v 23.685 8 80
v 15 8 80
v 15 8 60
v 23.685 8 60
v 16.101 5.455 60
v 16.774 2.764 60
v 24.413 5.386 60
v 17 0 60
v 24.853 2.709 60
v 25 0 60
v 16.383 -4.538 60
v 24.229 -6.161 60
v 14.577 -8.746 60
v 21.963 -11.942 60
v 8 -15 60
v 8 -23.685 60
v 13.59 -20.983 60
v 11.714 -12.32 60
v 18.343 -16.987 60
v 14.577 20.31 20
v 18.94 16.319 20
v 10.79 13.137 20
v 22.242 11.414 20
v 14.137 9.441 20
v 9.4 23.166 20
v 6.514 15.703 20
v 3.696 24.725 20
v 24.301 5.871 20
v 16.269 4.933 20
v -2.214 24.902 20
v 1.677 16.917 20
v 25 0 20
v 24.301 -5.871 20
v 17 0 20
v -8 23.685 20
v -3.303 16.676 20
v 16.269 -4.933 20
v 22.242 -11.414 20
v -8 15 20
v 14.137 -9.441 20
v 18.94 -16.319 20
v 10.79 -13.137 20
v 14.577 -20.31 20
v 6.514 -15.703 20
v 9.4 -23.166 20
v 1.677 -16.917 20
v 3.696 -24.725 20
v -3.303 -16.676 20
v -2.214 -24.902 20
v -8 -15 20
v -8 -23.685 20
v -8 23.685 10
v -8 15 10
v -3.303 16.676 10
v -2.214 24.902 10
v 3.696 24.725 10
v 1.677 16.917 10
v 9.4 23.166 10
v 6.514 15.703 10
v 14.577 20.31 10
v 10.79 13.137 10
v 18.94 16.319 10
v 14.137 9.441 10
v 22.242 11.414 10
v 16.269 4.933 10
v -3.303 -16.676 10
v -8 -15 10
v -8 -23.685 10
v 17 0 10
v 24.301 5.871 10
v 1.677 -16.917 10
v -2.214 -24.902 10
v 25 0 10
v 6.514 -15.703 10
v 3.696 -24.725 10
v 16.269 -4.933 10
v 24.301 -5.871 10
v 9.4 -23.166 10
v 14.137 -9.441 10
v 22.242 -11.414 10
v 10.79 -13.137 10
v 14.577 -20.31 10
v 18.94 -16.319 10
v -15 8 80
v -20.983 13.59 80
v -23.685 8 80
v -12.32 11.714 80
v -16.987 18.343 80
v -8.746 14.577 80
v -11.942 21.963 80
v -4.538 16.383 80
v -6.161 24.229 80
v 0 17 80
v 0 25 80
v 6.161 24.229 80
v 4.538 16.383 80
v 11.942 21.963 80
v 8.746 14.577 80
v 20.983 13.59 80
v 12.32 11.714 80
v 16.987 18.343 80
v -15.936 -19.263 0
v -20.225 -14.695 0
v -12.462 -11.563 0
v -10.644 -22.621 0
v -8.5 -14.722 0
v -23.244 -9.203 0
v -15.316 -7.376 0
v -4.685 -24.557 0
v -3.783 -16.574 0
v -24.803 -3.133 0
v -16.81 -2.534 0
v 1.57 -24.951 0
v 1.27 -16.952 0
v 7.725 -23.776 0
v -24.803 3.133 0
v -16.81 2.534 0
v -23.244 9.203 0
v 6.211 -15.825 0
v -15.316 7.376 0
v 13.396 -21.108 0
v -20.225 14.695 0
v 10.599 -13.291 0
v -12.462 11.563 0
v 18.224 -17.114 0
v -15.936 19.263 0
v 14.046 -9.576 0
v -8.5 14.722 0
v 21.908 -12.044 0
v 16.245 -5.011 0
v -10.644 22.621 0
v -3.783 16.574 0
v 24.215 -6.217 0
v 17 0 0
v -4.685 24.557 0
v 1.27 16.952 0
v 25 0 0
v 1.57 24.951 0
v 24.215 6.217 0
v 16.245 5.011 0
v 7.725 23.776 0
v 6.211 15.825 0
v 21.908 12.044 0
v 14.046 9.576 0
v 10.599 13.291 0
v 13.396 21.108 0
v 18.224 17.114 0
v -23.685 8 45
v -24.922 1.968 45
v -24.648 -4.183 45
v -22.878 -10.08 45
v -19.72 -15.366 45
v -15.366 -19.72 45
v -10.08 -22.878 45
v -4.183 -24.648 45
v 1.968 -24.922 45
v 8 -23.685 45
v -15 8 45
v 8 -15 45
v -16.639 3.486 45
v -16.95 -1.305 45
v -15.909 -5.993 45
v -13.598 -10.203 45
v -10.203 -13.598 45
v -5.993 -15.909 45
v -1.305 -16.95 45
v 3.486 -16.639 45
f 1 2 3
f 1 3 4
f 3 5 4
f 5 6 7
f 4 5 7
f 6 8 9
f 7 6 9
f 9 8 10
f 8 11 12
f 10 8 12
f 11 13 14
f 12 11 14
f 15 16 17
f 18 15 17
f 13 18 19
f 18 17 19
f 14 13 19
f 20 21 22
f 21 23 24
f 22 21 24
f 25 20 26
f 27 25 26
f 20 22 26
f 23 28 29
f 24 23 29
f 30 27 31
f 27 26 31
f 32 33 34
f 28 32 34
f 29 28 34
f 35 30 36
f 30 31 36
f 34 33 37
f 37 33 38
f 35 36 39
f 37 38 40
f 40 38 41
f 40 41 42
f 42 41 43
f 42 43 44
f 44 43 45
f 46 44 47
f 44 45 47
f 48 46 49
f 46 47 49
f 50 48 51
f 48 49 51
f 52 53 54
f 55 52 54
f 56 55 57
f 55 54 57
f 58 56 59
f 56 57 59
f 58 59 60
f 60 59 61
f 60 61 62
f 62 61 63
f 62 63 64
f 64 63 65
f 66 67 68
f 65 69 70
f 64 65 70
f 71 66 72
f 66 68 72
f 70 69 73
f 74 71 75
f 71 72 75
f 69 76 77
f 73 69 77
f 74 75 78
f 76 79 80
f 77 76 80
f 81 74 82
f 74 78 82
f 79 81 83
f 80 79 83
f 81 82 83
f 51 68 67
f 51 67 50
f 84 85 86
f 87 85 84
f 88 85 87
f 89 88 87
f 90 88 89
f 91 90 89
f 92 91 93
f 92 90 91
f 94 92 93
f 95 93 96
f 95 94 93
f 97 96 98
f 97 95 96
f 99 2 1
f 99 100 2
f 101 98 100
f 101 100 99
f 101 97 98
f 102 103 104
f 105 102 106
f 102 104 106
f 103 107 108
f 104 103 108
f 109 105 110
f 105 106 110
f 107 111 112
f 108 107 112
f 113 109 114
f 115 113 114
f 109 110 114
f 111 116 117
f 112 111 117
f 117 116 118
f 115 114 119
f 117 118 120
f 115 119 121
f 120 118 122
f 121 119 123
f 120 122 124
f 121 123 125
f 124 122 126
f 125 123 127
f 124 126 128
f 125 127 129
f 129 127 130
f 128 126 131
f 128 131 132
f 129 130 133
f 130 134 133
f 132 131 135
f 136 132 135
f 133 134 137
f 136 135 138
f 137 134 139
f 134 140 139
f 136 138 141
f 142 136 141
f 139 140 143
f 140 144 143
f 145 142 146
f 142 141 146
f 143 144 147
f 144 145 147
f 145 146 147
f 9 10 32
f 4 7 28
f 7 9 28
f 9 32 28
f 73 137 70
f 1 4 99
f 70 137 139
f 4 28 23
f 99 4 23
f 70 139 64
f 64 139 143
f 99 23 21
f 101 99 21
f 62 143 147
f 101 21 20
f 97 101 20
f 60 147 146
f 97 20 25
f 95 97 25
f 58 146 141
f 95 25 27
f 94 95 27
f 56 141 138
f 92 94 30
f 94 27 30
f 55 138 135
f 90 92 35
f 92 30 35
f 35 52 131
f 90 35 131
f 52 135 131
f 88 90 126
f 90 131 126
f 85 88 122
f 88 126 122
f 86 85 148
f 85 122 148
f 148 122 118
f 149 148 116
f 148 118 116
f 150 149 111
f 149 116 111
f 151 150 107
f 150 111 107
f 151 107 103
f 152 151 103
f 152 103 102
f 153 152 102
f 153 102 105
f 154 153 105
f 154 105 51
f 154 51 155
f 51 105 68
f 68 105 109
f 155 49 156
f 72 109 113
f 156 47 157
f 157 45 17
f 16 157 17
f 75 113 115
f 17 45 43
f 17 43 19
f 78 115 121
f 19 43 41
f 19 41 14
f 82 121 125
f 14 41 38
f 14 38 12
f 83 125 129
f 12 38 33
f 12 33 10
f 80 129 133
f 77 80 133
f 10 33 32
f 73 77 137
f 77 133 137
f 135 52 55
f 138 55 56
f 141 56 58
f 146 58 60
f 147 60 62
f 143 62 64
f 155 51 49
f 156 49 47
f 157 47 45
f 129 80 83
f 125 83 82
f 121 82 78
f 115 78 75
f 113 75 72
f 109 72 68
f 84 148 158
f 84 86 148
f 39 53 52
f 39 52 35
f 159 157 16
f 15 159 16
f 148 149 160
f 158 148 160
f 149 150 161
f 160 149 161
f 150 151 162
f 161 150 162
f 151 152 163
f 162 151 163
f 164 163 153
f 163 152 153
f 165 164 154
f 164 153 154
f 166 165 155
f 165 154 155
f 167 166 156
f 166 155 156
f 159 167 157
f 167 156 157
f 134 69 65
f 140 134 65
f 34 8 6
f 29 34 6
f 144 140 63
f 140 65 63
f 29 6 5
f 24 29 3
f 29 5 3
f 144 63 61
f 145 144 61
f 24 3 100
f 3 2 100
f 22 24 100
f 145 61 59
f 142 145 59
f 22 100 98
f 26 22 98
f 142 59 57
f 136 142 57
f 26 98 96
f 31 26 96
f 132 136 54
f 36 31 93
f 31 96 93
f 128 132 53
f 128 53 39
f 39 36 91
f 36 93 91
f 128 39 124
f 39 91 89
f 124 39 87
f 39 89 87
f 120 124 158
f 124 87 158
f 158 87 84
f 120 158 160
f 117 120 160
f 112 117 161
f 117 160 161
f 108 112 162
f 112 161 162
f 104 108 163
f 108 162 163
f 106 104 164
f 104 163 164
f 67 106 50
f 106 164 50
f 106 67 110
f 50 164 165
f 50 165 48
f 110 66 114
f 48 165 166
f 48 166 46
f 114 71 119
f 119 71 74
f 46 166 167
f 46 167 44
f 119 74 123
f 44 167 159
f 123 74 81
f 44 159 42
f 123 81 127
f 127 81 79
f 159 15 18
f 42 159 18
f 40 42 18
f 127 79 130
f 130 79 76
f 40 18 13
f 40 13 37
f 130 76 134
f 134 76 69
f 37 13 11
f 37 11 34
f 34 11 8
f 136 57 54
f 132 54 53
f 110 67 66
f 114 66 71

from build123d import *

# Parameters (mm, degrees)
F0_R     = 25
F1_DEPTH = 80
F2_R     = 17
F3_DEPTH = 80
F5_W     = 25
F5_H     = 35
F6_DEPTH = 33
F5_W_2   = 8
F5_H_2   = 10
F7_DEPTH = 50


with BuildPart() as f1:
    # F0 (on Top) → F1 (new body)
    with BuildSketch(Plane.XY):
        Circle(F0_R)
    extrude(amount=F1_DEPTH)

    # F2 (on face) → F3 (cut)
    with BuildSketch(Plane.XY.offset(80)):
        Circle(F2_R)
    extrude(amount=-F3_DEPTH, mode=Mode.SUBTRACT)

    # F5 (on offset) → F6 (cut)
    with BuildSketch(Plane.XZ.offset(25)):
        Polygon((0, 80), (0, 45), (8, 45), (8, 60), (25, 60), (25, 80), (8, 80), align=None)
        with Locations((-12.5, 62.5)):
            Rectangle(F5_W, F5_H)
    extrude(amount=-F6_DEPTH, mode=Mode.SUBTRACT)

    # F5 (on offset) → F7 (cut)
    with BuildSketch(Plane.XZ.offset(25)):
        with Locations((-4, 15)):
            Rectangle(F5_W_2, F5_H_2)
        with Locations((12.5, 15)):
            Rectangle(F5_W, F5_H_2)
    extrude(amount=-F7_DEPTH, mode=Mode.SUBTRACT)


solid = f1.part
